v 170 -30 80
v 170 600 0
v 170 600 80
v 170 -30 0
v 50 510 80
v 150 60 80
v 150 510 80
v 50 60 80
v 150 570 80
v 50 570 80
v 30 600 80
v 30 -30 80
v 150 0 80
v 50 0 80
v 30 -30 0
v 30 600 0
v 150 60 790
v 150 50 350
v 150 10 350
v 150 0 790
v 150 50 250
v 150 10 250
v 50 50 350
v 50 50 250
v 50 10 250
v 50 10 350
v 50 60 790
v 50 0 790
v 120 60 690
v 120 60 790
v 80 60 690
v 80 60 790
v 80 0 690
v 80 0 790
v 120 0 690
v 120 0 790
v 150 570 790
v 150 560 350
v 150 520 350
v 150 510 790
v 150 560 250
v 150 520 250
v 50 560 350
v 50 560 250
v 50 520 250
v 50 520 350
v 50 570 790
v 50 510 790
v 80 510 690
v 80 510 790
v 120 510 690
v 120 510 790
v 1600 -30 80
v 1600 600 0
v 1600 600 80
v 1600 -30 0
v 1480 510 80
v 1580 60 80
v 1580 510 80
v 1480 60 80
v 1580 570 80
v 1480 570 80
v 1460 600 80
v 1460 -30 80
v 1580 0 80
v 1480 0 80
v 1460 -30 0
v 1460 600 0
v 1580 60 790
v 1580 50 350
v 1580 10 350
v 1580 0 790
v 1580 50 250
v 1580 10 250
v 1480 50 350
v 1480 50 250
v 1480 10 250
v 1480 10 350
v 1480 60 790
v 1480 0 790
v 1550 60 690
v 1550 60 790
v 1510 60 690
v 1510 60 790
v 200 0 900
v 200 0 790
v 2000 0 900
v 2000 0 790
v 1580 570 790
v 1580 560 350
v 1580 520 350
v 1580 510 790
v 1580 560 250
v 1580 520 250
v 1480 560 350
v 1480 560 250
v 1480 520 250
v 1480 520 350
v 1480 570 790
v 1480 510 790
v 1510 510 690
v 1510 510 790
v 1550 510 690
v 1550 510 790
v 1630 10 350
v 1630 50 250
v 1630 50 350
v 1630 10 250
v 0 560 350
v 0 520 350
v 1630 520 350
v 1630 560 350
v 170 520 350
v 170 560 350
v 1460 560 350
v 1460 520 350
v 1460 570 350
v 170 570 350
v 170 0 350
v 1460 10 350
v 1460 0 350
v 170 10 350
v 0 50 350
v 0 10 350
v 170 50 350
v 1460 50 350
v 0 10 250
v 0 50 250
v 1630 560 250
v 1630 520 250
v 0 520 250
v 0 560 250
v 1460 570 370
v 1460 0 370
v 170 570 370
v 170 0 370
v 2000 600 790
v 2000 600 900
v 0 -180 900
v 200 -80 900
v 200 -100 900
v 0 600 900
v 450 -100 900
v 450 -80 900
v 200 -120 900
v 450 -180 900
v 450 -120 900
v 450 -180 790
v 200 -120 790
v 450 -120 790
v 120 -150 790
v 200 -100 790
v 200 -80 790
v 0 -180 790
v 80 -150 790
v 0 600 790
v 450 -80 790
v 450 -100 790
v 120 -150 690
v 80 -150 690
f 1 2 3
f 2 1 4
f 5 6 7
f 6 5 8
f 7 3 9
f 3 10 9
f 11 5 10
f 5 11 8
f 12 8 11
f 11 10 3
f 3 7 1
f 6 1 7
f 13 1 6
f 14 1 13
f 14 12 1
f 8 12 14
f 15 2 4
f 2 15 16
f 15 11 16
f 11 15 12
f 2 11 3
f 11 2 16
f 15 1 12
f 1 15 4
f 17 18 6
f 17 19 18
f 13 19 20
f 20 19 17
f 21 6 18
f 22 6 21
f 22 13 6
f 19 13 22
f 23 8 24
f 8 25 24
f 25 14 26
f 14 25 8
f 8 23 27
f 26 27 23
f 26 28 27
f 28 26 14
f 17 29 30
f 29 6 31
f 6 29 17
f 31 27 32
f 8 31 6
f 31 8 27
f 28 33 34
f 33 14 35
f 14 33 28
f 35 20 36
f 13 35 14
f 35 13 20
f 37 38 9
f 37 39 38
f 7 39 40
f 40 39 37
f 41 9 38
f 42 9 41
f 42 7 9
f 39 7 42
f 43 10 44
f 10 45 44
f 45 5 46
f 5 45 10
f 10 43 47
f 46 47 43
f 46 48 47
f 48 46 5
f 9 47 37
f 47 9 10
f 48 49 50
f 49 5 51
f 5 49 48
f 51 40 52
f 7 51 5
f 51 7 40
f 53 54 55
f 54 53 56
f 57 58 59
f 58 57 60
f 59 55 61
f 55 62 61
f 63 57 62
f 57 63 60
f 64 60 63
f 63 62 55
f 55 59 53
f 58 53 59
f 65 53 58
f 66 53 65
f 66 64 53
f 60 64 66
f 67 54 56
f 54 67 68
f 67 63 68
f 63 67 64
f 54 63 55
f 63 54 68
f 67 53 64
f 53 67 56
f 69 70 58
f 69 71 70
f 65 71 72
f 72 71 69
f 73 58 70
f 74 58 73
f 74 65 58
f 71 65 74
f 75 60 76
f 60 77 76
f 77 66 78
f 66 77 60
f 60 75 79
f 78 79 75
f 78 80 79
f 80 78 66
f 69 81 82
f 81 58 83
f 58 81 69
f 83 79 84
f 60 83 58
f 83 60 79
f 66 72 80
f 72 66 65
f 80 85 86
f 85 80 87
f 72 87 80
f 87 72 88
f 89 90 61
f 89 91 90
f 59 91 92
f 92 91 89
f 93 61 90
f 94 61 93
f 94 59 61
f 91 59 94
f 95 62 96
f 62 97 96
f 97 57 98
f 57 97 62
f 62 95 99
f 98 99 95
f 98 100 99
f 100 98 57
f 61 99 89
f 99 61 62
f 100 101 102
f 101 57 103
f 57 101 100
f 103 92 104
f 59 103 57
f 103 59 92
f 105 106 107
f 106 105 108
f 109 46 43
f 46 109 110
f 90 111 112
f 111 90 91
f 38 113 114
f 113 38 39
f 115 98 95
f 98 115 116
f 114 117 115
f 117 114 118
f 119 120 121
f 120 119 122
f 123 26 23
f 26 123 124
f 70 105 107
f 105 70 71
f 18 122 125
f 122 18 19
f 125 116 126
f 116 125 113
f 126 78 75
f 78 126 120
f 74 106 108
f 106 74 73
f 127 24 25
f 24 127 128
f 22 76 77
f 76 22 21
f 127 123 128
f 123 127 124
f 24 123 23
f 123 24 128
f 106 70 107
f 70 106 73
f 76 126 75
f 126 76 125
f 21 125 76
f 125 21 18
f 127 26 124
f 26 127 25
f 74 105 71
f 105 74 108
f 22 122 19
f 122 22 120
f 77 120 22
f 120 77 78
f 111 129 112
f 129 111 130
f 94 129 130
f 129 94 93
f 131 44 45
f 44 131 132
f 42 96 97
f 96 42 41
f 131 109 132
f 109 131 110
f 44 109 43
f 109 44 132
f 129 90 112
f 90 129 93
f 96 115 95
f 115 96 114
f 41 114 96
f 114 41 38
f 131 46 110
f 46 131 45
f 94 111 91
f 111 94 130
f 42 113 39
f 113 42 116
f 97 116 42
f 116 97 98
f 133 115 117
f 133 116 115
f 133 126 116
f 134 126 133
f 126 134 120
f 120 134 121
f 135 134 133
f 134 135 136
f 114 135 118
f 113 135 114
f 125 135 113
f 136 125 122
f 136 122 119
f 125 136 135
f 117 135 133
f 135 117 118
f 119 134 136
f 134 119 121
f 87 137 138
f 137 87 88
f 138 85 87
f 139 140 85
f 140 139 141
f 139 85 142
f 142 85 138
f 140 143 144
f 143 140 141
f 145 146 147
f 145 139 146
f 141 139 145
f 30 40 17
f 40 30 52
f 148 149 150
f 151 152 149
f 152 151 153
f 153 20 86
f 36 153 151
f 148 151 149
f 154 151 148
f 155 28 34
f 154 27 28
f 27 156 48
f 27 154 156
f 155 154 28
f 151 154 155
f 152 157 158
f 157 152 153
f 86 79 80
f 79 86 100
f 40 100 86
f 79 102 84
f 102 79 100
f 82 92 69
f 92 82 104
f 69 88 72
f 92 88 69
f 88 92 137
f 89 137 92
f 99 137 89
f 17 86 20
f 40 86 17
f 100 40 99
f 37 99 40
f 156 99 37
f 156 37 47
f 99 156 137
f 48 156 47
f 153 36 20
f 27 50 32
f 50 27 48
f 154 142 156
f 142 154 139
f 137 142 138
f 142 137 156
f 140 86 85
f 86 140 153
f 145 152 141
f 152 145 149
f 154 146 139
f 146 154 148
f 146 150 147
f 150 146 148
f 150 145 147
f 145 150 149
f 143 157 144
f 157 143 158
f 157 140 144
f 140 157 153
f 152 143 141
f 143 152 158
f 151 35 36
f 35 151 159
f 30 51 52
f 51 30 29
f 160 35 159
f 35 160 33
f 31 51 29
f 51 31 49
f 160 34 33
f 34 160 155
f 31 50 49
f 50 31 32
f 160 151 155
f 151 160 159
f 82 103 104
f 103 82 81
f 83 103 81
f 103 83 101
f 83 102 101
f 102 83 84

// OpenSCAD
/*

    Scandinavian workbench
    
    By Anton Augustsson
    
    
*/



/*
    ---------- Variables ---------- 
*/

width = 600; 
length = 2000;
height = 900;
thickness = 110;

viseArmWidth = 250;
viseClampingCapacity = 100;
viseArmClampWidth = 60;
clampThickness = 20;
viseLenght = viseClampingCapacity
    +viseArmClampWidth
    +clampThickness;
viseWidth = 200;

legLength = height-thickness/2;
legWidth = 100;
legThickness = 60;

baseExtendsionFromTop = 30;
baseWidth = 140;
baseThickness = 80;
baseLength = width
    +baseExtendsionFromTop;

tailViseLenght = 400;

stretchersLenght = length-tailViseLenght
    +(viseWidth/2-baseWidth/2);
stretchersWidth = legWidth;
stretchersThickness = legThickness-20;
stretchersHeight = 250;

selfLenght=length
    -(tailViseLenght+baseWidth*2
    +viseWidth/2-baseWidth/2);
selfWidth=width
    -baseExtendsionFromTop;
selfThickness=20;

topStudLength1=width+viseLenght
    -baseExtendsionFromTop*2;
topStudLength2=width
    -baseExtendsionFromTop;
topStudWidth=stretchersWidth;
topStudThickness=stretchersThickness;

/*
    ---------- Code ---------- 
*/

// ---------- Leg ----------

// base left
translate([
    viseWidth/2-baseWidth/2,
    -baseExtendsionFromTop,
    0]) 
cube(size = [
    baseWidth,
    baseLength,
    baseThickness]);

// Leg 1
translate([
    viseWidth/2-legWidth/2,
    0,
    0]) 
cube(size = [
    legWidth,
    legThickness,
    legLength]);

// Leg 2
translate([
    viseWidth/2-legWidth/2,
    width-baseExtendsionFromTop
    -legThickness,
    0]) 
cube(size = [
    legWidth,
    legThickness,
    legLength]);


// base right
translate([
    length-baseWidth-tailViseLenght,
    -baseExtendsionFromTop,
    0]) 
cube(size = [
    baseWidth,
    baseLength,
    baseThickness]);

// Leg 3
translate([
    length-tailViseLenght-legWidth
    -(baseWidth/2-legWidth/2),
    0,
    0]) 
cube(size = [
    legWidth,
    legThickness,
    legLength]);

// Leg 4
translate([
    length-tailViseLenght-legWidth
    -(baseWidth/2-legWidth/2),
    width-baseExtendsionFromTop
    -legThickness,
    0]) 
cube(size = [
    legWidth,
    legThickness,
    legLength]);

// stretchers 1
translate([
    0,
    (legThickness/2 
    -stretchersThickness/2),
    stretchersHeight]) 
cube(size = [
    stretchersLenght,
    stretchersThickness,
    stretchersWidth]);

// stretchers 2
translate([
    0,
    width-baseExtendsionFromTop
    -legThickness
    +(legThickness/2 
    -stretchersThickness/2),
    stretchersHeight]) 
cube(size = [
    stretchersLenght,
    stretchersThickness,
    stretchersWidth]);

// Self
translate([
    viseWidth/2-baseWidth/2
    +baseWidth,
    0,
    stretchersHeight
    +stretchersWidth]) 
cube(size = [
    selfLenght,
    selfWidth,
    selfThickness]);




// ---------- Top ----------

// bench top
translate([
    0,
    0,
    height-thickness]) 
cube(size = [
    length,
    width,
    thickness]);

// schould 
translate([
    0,
    -viseLenght,
    height-thickness]) 
cube(size = [
    viseWidth,
    viseLenght,
    thickness]);

// schould vise
translate([
    viseWidth,
    -viseLenght,
    height-thickness]) 
cube(size = [
    viseArmWidth,
    viseArmClampWidth,
    thickness]);

// schould vise
translate([
    viseWidth,
    -viseLenght+80,
    height-thickness]) 
cube(size = [
    viseArmWidth,
    clampThickness,
    thickness]);

// left stud
translate([
    viseWidth/2-topStudThickness/2,
    -viseLenght+baseExtendsionFromTop,
    height-thickness-topStudWidth]) 
cube(size = [
    topStudThickness,
    topStudLength1,
    topStudWidth]);

// left stud
translate([
    length-tailViseLenght-legWidth
    -(baseWidth/2-legWidth/2)
    +(legWidth/2-topStudThickness/2),
    0,
    height-thickness-topStudWidth]) 
cube(size = [
    topStudThickness,
    topStudLength2,
    topStudWidth]);
    
